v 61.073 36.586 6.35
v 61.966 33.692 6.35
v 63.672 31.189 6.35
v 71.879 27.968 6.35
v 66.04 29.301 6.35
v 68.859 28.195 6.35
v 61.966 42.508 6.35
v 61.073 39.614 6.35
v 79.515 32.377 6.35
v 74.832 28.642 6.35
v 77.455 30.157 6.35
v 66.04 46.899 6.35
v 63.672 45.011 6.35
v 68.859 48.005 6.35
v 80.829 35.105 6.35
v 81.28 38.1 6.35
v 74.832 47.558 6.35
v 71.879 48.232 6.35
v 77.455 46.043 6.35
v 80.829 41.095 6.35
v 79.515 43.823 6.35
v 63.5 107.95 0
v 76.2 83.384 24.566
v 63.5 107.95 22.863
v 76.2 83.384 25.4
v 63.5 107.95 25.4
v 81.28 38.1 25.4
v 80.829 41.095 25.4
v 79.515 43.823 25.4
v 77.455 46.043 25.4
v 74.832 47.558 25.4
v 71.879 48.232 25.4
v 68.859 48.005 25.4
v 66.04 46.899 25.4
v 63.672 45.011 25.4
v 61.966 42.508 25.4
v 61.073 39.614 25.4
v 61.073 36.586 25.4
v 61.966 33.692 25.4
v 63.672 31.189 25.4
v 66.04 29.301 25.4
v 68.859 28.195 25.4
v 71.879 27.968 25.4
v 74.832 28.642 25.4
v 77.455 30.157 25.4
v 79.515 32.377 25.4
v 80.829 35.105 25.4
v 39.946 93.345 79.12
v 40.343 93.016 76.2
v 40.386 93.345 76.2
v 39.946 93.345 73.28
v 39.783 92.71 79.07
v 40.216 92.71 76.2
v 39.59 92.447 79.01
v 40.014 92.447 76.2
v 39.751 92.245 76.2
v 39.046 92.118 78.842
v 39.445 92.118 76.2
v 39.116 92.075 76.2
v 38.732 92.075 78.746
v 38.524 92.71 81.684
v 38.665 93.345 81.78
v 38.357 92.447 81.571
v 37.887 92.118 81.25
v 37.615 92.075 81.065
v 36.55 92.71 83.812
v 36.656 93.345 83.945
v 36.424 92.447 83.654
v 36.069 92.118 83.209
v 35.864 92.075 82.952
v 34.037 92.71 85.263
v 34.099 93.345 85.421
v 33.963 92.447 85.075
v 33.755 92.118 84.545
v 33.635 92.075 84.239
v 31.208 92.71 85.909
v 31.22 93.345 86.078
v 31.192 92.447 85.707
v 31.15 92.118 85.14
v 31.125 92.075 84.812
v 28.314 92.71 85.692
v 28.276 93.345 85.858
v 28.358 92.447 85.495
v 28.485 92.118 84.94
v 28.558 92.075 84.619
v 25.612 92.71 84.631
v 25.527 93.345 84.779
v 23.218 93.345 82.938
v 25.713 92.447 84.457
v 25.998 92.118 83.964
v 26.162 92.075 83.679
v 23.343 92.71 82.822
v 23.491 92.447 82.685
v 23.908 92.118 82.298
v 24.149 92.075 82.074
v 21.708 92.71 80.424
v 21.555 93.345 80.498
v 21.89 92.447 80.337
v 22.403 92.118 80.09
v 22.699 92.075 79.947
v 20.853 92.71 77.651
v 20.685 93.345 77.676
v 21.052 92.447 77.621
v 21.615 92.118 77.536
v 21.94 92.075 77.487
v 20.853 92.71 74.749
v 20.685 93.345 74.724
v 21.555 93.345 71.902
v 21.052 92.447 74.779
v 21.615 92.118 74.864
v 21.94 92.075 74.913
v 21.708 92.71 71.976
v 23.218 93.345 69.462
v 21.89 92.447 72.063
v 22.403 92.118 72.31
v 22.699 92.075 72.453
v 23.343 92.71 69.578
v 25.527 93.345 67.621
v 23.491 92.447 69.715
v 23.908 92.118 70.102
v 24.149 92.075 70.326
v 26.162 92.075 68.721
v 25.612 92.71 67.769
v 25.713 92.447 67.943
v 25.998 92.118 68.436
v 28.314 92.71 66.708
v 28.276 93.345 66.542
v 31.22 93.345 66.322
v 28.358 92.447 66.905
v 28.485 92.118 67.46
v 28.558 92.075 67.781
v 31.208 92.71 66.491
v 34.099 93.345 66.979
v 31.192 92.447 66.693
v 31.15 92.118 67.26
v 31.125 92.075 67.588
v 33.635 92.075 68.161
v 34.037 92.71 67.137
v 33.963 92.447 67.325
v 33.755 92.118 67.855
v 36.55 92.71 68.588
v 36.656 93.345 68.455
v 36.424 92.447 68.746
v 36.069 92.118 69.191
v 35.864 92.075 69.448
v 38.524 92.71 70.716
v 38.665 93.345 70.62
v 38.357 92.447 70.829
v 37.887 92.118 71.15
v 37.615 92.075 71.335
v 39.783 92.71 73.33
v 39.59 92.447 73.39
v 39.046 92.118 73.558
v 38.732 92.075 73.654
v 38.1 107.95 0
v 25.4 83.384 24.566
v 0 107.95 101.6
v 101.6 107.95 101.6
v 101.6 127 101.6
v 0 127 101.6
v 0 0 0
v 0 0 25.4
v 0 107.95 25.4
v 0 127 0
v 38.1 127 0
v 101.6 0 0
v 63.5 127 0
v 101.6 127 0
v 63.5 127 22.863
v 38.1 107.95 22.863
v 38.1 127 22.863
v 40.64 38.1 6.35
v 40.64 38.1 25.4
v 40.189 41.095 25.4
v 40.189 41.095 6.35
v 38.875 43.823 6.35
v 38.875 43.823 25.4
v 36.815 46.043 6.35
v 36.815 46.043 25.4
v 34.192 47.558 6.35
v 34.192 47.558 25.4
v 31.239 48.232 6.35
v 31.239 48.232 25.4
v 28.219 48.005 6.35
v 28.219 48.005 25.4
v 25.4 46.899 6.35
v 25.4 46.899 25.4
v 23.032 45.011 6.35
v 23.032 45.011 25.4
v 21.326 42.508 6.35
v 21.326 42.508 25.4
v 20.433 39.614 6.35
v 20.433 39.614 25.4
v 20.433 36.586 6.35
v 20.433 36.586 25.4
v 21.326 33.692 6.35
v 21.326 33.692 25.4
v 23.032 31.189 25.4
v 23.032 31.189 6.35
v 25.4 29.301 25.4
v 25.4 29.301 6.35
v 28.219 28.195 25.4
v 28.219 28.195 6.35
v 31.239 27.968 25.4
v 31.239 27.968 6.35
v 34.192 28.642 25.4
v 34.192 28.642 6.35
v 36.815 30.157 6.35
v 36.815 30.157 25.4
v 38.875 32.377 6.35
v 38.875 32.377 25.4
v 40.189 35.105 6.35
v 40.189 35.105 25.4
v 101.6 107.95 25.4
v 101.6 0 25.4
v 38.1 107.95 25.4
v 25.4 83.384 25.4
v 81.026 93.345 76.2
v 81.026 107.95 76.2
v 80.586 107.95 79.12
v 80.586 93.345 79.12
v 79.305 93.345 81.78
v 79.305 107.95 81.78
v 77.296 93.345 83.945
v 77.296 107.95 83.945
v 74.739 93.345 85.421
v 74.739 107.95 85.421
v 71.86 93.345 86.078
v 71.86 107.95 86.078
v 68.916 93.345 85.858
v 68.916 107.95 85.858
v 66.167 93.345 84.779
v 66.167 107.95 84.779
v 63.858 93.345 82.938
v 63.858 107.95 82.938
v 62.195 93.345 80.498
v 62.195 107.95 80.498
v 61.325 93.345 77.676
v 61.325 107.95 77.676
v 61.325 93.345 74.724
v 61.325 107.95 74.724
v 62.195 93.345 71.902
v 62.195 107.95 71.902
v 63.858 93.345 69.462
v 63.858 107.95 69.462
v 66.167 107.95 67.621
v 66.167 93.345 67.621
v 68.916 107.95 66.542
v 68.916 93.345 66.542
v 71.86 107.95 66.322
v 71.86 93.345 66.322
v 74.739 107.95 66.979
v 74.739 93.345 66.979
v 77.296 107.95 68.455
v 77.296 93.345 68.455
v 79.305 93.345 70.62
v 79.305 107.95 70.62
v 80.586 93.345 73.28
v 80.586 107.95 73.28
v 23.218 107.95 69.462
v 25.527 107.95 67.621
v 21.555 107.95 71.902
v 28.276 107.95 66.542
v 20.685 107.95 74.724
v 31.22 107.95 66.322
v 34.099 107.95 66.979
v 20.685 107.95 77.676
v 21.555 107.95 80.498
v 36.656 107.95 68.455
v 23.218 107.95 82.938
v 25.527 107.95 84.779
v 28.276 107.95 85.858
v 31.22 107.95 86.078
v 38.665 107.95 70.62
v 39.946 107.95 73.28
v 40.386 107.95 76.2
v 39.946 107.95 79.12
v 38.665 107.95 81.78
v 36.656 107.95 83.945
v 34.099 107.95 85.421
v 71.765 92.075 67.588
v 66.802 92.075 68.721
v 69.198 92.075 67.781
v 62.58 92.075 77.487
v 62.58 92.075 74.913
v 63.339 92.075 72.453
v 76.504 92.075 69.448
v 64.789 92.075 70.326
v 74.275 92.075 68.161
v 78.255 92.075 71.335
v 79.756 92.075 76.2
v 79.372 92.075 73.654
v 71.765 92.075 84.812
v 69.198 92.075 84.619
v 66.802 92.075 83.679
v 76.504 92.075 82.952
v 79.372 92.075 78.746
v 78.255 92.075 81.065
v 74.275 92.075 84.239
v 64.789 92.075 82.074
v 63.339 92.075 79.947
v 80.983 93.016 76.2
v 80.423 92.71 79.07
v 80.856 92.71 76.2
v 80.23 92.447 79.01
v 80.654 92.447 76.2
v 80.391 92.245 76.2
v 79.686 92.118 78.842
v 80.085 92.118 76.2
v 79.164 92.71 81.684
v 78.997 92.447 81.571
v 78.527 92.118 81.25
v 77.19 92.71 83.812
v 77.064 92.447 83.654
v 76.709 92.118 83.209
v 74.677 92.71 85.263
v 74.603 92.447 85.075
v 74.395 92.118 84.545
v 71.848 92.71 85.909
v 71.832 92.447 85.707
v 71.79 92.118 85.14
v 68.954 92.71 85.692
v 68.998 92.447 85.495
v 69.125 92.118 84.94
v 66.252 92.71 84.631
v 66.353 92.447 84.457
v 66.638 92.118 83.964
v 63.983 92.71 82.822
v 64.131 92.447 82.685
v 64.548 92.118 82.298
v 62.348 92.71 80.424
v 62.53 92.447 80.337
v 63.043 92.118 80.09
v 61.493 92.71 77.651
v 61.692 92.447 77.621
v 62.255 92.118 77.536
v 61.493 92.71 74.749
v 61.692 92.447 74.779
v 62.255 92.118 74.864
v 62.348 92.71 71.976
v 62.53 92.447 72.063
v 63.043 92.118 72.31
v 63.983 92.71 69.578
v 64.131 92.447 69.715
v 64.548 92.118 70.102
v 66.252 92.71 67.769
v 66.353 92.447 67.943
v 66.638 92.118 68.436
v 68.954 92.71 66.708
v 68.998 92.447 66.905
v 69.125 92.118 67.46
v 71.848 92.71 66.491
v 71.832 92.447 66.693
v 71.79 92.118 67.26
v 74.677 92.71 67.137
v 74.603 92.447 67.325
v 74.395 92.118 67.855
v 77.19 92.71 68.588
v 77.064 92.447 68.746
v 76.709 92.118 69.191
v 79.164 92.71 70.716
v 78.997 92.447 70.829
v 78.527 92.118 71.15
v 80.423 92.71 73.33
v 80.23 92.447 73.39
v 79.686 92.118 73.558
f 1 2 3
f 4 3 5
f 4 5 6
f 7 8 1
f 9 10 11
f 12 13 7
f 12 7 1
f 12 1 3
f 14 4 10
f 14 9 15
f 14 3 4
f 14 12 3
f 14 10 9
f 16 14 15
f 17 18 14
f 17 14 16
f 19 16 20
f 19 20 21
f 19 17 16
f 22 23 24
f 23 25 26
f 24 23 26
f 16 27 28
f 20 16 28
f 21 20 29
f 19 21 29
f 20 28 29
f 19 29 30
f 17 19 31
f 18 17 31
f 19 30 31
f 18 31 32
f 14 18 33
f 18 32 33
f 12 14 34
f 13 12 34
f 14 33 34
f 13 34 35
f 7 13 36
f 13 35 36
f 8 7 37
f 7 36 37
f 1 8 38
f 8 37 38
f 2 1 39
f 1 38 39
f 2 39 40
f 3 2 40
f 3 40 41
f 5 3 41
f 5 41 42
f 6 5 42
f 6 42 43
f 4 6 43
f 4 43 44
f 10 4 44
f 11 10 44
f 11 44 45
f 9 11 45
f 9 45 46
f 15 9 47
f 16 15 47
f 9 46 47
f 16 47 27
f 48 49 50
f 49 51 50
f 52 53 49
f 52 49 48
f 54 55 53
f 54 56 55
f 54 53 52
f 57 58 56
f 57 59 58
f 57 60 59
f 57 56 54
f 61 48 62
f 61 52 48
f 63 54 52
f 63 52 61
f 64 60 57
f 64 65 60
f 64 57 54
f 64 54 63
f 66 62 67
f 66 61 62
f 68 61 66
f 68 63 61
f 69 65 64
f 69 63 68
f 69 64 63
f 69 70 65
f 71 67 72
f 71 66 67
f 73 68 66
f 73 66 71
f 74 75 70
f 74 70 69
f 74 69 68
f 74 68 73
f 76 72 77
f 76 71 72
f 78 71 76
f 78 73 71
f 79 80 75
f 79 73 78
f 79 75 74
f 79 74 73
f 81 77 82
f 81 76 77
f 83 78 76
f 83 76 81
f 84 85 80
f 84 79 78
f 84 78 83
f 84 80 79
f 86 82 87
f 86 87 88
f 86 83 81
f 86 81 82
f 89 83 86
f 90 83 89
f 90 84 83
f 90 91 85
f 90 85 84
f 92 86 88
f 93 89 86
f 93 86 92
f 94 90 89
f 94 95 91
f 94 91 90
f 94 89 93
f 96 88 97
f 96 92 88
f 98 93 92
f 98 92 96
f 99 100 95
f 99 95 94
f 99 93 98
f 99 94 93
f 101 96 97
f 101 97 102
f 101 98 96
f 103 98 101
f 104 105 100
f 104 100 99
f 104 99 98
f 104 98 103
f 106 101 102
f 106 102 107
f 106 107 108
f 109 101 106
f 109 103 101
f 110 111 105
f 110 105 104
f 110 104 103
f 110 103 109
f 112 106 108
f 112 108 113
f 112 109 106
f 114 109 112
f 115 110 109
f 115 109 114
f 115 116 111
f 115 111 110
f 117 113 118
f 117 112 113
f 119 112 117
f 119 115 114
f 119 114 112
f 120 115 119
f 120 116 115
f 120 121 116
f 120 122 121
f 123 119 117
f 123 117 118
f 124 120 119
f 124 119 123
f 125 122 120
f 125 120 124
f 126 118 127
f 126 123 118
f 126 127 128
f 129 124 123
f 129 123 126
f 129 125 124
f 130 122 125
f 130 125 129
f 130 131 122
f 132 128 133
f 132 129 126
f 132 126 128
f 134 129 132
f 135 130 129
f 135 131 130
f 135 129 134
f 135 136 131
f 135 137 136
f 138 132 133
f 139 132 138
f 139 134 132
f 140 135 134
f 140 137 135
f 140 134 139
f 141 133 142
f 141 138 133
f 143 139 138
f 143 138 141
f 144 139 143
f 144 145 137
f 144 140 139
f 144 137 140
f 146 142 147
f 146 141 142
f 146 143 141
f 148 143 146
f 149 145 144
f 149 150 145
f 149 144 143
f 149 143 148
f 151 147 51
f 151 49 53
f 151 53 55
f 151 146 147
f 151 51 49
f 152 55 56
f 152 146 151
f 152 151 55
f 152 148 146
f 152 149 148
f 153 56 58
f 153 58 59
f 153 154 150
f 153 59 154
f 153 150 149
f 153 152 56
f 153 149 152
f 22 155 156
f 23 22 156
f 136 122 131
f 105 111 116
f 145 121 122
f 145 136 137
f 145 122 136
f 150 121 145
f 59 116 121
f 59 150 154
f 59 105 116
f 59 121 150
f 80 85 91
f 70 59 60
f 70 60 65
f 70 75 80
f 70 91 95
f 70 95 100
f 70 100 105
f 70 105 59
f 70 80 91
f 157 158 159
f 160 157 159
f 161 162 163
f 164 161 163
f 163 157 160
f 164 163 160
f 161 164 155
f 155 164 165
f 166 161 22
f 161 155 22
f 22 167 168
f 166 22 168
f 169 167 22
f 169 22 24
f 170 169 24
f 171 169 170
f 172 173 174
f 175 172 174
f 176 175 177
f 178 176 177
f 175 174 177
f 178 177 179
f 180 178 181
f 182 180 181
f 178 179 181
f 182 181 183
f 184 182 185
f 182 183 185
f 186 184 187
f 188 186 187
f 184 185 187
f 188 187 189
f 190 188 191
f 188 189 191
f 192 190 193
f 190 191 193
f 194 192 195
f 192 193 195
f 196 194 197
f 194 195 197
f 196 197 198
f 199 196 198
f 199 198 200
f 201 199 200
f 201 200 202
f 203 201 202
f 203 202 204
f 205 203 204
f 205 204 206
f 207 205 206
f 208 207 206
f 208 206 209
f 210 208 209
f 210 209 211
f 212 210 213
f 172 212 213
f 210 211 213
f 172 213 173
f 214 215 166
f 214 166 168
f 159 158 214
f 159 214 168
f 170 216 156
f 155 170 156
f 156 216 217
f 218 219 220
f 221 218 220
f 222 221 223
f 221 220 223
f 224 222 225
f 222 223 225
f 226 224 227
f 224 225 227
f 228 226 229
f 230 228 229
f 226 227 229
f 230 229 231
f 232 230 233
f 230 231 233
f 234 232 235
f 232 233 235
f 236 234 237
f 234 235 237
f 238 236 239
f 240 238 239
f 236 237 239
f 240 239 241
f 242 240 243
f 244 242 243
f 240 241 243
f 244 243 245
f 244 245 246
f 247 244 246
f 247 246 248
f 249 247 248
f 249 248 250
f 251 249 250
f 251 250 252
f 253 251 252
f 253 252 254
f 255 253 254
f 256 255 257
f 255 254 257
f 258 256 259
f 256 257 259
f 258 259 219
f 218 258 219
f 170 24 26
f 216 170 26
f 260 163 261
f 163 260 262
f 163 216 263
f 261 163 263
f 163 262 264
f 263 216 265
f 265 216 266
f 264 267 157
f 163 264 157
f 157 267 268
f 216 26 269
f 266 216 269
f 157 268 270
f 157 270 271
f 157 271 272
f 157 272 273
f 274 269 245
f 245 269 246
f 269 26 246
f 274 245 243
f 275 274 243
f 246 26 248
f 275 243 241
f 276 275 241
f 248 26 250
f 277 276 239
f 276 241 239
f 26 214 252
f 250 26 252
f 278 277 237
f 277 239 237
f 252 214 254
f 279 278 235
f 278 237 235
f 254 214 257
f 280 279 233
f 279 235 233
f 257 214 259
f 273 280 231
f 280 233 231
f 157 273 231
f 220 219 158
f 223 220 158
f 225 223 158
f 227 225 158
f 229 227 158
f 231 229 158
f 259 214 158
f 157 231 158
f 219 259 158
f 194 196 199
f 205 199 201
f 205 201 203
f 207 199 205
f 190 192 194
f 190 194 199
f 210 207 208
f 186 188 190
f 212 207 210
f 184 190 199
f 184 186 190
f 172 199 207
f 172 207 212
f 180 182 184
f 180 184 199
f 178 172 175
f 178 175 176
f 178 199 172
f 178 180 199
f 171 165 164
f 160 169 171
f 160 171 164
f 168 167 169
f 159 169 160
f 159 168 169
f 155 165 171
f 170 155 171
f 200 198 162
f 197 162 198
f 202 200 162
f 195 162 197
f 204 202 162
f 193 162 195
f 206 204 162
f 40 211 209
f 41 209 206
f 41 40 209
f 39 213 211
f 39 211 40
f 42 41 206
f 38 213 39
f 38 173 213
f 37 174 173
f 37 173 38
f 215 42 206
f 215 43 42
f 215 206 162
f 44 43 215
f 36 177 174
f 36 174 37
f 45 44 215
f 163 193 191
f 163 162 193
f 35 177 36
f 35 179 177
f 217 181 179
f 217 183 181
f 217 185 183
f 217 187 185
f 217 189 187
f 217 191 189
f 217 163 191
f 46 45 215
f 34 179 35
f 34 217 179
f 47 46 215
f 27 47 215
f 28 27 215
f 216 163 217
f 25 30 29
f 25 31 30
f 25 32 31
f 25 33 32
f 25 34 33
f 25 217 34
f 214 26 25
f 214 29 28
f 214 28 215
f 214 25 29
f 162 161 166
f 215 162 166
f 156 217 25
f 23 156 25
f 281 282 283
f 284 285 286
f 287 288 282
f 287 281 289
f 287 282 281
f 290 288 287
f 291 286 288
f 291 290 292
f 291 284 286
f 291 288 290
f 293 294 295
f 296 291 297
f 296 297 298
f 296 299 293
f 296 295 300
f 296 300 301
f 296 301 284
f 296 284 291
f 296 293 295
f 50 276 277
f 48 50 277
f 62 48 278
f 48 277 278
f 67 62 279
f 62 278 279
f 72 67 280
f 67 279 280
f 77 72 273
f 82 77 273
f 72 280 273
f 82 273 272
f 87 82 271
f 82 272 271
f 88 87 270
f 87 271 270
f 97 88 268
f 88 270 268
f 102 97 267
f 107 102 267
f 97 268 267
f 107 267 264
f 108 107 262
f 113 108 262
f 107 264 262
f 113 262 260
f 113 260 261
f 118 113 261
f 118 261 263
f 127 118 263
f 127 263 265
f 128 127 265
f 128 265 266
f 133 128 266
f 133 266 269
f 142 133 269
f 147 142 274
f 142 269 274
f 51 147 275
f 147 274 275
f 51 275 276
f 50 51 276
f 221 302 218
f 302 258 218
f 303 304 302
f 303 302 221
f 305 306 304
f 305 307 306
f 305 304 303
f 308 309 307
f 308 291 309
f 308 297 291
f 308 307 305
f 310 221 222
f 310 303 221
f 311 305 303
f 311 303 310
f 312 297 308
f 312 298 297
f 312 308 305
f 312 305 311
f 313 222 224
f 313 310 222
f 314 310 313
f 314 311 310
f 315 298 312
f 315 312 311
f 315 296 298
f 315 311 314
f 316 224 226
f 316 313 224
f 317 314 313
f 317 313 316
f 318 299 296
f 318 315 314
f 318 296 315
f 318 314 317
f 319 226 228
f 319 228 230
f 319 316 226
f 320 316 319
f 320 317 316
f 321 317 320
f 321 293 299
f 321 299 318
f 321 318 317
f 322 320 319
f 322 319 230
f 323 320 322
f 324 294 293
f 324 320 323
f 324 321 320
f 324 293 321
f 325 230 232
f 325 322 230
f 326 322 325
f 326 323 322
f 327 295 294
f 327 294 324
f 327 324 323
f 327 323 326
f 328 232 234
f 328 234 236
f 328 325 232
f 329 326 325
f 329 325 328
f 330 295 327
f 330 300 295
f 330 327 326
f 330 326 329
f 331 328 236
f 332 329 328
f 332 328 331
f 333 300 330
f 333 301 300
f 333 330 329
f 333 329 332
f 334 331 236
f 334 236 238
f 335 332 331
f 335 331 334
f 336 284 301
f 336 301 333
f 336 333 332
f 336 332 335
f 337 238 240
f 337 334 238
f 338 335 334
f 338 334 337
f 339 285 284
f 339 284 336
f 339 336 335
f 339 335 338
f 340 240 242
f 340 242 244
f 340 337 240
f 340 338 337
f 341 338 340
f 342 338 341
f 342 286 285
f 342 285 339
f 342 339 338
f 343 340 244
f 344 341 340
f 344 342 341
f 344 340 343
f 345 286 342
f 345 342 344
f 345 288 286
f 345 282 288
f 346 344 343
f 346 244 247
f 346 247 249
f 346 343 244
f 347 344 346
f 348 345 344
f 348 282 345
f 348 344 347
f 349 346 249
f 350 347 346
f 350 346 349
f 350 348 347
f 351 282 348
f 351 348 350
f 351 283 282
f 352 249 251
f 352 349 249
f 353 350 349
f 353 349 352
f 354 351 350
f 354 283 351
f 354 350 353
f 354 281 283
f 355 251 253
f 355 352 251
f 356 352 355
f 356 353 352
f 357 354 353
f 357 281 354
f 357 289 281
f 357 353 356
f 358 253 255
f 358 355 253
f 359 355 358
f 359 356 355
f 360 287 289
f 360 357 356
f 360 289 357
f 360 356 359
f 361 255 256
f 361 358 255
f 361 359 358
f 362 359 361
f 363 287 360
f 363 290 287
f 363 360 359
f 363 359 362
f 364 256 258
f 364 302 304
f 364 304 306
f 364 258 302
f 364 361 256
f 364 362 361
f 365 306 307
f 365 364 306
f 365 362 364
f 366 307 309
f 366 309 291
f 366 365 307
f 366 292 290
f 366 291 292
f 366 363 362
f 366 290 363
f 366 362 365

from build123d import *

# Parameters (mm, degrees)
F0_W      = 101.6
F0_H      = 127
F1_DEPTH  = 25.4
F2_R      = 10.16
F3_DEPTH  = 19.05
F4_W      = 19.05
F4_H      = 76.2
F5_DEPTH  = 101.6
F6_R      = 9.906
F7_DEPTH  = 15.875
F8_R      = 1.27
F10_DEPTH = 25.401
F11_W     = 25.4
F11_H     = 22.863189
F12_DEPTH = 25.4
F14_DEPTH = 101.6


with BuildPart() as f1:
    # F0 (on Top) → F1 (new body)
    with BuildSketch(Plane.XY):
        with Locations((50.8, 63.5)):
            Rectangle(F0_W, F0_H)
    extrude(amount=F1_DEPTH)

    # F2 (on face) → F3 (cut)
    with BuildSketch(Plane.XY.offset(25.4)):
        with Locations((30.48, 38.1)):
            Circle(F2_R)
        with Locations((71.12, 38.1)):
            Circle(F2_R)
    extrude(amount=-F3_DEPTH, mode=Mode.SUBTRACT)

    # F4 (on face) → F5 (join)
    with BuildSketch(Plane.YZ.offset(101.6)):
        with Locations((117.475, 63.5)):
            Rectangle(F4_W, F4_H)
    extrude(amount=-F5_DEPTH)

    # F6 (on face) → F7 (join)
    with BuildSketch(Plane.XZ.offset(-107.95)):
        with Locations((30.48, 76.2)):
            Circle(F6_R)
        with Locations((71.12, 76.2)):
            Circle(F6_R)
    extrude(amount=F7_DEPTH)

    # F8
    f8_edges = [f1.edges().sort_by_distance(p)[0] for p in [
        (61.214, 92.075, 76.2),
        (20.574, 92.075, 76.2),
    ]]
    fillet(f8_edges, radius=F8_R)

    # F9 (on face) → F10 (cut, through all)
    with BuildSketch(Plane.XY.offset(25.4)):
        Polygon((63.5, 107.95), (38.1, 107.95), (25.4, 83.384298), (76.2, 83.384298), align=None)
    extrude(amount=-F10_DEPTH, mode=Mode.SUBTRACT)

    # F11 (on face) → F12 (cut)
    with BuildSketch(Plane(origin=(0, 127, 0), x_dir=(-1, 0, 0), z_dir=(0, 1, 0))):
        with Locations((-50.8, 11.431594)):
            Rectangle(F11_W, F11_H)
    extrude(amount=-F12_DEPTH, mode=Mode.SUBTRACT)

    # F13 (on face) → F14 (join)
    with BuildSketch(Plane.YZ.offset(101.6)):
        Polygon((82.55, 0), (107.95, 0), (82.55, 25.4), align=None)
    extrude(amount=-F14_DEPTH)


solid = f1.part
